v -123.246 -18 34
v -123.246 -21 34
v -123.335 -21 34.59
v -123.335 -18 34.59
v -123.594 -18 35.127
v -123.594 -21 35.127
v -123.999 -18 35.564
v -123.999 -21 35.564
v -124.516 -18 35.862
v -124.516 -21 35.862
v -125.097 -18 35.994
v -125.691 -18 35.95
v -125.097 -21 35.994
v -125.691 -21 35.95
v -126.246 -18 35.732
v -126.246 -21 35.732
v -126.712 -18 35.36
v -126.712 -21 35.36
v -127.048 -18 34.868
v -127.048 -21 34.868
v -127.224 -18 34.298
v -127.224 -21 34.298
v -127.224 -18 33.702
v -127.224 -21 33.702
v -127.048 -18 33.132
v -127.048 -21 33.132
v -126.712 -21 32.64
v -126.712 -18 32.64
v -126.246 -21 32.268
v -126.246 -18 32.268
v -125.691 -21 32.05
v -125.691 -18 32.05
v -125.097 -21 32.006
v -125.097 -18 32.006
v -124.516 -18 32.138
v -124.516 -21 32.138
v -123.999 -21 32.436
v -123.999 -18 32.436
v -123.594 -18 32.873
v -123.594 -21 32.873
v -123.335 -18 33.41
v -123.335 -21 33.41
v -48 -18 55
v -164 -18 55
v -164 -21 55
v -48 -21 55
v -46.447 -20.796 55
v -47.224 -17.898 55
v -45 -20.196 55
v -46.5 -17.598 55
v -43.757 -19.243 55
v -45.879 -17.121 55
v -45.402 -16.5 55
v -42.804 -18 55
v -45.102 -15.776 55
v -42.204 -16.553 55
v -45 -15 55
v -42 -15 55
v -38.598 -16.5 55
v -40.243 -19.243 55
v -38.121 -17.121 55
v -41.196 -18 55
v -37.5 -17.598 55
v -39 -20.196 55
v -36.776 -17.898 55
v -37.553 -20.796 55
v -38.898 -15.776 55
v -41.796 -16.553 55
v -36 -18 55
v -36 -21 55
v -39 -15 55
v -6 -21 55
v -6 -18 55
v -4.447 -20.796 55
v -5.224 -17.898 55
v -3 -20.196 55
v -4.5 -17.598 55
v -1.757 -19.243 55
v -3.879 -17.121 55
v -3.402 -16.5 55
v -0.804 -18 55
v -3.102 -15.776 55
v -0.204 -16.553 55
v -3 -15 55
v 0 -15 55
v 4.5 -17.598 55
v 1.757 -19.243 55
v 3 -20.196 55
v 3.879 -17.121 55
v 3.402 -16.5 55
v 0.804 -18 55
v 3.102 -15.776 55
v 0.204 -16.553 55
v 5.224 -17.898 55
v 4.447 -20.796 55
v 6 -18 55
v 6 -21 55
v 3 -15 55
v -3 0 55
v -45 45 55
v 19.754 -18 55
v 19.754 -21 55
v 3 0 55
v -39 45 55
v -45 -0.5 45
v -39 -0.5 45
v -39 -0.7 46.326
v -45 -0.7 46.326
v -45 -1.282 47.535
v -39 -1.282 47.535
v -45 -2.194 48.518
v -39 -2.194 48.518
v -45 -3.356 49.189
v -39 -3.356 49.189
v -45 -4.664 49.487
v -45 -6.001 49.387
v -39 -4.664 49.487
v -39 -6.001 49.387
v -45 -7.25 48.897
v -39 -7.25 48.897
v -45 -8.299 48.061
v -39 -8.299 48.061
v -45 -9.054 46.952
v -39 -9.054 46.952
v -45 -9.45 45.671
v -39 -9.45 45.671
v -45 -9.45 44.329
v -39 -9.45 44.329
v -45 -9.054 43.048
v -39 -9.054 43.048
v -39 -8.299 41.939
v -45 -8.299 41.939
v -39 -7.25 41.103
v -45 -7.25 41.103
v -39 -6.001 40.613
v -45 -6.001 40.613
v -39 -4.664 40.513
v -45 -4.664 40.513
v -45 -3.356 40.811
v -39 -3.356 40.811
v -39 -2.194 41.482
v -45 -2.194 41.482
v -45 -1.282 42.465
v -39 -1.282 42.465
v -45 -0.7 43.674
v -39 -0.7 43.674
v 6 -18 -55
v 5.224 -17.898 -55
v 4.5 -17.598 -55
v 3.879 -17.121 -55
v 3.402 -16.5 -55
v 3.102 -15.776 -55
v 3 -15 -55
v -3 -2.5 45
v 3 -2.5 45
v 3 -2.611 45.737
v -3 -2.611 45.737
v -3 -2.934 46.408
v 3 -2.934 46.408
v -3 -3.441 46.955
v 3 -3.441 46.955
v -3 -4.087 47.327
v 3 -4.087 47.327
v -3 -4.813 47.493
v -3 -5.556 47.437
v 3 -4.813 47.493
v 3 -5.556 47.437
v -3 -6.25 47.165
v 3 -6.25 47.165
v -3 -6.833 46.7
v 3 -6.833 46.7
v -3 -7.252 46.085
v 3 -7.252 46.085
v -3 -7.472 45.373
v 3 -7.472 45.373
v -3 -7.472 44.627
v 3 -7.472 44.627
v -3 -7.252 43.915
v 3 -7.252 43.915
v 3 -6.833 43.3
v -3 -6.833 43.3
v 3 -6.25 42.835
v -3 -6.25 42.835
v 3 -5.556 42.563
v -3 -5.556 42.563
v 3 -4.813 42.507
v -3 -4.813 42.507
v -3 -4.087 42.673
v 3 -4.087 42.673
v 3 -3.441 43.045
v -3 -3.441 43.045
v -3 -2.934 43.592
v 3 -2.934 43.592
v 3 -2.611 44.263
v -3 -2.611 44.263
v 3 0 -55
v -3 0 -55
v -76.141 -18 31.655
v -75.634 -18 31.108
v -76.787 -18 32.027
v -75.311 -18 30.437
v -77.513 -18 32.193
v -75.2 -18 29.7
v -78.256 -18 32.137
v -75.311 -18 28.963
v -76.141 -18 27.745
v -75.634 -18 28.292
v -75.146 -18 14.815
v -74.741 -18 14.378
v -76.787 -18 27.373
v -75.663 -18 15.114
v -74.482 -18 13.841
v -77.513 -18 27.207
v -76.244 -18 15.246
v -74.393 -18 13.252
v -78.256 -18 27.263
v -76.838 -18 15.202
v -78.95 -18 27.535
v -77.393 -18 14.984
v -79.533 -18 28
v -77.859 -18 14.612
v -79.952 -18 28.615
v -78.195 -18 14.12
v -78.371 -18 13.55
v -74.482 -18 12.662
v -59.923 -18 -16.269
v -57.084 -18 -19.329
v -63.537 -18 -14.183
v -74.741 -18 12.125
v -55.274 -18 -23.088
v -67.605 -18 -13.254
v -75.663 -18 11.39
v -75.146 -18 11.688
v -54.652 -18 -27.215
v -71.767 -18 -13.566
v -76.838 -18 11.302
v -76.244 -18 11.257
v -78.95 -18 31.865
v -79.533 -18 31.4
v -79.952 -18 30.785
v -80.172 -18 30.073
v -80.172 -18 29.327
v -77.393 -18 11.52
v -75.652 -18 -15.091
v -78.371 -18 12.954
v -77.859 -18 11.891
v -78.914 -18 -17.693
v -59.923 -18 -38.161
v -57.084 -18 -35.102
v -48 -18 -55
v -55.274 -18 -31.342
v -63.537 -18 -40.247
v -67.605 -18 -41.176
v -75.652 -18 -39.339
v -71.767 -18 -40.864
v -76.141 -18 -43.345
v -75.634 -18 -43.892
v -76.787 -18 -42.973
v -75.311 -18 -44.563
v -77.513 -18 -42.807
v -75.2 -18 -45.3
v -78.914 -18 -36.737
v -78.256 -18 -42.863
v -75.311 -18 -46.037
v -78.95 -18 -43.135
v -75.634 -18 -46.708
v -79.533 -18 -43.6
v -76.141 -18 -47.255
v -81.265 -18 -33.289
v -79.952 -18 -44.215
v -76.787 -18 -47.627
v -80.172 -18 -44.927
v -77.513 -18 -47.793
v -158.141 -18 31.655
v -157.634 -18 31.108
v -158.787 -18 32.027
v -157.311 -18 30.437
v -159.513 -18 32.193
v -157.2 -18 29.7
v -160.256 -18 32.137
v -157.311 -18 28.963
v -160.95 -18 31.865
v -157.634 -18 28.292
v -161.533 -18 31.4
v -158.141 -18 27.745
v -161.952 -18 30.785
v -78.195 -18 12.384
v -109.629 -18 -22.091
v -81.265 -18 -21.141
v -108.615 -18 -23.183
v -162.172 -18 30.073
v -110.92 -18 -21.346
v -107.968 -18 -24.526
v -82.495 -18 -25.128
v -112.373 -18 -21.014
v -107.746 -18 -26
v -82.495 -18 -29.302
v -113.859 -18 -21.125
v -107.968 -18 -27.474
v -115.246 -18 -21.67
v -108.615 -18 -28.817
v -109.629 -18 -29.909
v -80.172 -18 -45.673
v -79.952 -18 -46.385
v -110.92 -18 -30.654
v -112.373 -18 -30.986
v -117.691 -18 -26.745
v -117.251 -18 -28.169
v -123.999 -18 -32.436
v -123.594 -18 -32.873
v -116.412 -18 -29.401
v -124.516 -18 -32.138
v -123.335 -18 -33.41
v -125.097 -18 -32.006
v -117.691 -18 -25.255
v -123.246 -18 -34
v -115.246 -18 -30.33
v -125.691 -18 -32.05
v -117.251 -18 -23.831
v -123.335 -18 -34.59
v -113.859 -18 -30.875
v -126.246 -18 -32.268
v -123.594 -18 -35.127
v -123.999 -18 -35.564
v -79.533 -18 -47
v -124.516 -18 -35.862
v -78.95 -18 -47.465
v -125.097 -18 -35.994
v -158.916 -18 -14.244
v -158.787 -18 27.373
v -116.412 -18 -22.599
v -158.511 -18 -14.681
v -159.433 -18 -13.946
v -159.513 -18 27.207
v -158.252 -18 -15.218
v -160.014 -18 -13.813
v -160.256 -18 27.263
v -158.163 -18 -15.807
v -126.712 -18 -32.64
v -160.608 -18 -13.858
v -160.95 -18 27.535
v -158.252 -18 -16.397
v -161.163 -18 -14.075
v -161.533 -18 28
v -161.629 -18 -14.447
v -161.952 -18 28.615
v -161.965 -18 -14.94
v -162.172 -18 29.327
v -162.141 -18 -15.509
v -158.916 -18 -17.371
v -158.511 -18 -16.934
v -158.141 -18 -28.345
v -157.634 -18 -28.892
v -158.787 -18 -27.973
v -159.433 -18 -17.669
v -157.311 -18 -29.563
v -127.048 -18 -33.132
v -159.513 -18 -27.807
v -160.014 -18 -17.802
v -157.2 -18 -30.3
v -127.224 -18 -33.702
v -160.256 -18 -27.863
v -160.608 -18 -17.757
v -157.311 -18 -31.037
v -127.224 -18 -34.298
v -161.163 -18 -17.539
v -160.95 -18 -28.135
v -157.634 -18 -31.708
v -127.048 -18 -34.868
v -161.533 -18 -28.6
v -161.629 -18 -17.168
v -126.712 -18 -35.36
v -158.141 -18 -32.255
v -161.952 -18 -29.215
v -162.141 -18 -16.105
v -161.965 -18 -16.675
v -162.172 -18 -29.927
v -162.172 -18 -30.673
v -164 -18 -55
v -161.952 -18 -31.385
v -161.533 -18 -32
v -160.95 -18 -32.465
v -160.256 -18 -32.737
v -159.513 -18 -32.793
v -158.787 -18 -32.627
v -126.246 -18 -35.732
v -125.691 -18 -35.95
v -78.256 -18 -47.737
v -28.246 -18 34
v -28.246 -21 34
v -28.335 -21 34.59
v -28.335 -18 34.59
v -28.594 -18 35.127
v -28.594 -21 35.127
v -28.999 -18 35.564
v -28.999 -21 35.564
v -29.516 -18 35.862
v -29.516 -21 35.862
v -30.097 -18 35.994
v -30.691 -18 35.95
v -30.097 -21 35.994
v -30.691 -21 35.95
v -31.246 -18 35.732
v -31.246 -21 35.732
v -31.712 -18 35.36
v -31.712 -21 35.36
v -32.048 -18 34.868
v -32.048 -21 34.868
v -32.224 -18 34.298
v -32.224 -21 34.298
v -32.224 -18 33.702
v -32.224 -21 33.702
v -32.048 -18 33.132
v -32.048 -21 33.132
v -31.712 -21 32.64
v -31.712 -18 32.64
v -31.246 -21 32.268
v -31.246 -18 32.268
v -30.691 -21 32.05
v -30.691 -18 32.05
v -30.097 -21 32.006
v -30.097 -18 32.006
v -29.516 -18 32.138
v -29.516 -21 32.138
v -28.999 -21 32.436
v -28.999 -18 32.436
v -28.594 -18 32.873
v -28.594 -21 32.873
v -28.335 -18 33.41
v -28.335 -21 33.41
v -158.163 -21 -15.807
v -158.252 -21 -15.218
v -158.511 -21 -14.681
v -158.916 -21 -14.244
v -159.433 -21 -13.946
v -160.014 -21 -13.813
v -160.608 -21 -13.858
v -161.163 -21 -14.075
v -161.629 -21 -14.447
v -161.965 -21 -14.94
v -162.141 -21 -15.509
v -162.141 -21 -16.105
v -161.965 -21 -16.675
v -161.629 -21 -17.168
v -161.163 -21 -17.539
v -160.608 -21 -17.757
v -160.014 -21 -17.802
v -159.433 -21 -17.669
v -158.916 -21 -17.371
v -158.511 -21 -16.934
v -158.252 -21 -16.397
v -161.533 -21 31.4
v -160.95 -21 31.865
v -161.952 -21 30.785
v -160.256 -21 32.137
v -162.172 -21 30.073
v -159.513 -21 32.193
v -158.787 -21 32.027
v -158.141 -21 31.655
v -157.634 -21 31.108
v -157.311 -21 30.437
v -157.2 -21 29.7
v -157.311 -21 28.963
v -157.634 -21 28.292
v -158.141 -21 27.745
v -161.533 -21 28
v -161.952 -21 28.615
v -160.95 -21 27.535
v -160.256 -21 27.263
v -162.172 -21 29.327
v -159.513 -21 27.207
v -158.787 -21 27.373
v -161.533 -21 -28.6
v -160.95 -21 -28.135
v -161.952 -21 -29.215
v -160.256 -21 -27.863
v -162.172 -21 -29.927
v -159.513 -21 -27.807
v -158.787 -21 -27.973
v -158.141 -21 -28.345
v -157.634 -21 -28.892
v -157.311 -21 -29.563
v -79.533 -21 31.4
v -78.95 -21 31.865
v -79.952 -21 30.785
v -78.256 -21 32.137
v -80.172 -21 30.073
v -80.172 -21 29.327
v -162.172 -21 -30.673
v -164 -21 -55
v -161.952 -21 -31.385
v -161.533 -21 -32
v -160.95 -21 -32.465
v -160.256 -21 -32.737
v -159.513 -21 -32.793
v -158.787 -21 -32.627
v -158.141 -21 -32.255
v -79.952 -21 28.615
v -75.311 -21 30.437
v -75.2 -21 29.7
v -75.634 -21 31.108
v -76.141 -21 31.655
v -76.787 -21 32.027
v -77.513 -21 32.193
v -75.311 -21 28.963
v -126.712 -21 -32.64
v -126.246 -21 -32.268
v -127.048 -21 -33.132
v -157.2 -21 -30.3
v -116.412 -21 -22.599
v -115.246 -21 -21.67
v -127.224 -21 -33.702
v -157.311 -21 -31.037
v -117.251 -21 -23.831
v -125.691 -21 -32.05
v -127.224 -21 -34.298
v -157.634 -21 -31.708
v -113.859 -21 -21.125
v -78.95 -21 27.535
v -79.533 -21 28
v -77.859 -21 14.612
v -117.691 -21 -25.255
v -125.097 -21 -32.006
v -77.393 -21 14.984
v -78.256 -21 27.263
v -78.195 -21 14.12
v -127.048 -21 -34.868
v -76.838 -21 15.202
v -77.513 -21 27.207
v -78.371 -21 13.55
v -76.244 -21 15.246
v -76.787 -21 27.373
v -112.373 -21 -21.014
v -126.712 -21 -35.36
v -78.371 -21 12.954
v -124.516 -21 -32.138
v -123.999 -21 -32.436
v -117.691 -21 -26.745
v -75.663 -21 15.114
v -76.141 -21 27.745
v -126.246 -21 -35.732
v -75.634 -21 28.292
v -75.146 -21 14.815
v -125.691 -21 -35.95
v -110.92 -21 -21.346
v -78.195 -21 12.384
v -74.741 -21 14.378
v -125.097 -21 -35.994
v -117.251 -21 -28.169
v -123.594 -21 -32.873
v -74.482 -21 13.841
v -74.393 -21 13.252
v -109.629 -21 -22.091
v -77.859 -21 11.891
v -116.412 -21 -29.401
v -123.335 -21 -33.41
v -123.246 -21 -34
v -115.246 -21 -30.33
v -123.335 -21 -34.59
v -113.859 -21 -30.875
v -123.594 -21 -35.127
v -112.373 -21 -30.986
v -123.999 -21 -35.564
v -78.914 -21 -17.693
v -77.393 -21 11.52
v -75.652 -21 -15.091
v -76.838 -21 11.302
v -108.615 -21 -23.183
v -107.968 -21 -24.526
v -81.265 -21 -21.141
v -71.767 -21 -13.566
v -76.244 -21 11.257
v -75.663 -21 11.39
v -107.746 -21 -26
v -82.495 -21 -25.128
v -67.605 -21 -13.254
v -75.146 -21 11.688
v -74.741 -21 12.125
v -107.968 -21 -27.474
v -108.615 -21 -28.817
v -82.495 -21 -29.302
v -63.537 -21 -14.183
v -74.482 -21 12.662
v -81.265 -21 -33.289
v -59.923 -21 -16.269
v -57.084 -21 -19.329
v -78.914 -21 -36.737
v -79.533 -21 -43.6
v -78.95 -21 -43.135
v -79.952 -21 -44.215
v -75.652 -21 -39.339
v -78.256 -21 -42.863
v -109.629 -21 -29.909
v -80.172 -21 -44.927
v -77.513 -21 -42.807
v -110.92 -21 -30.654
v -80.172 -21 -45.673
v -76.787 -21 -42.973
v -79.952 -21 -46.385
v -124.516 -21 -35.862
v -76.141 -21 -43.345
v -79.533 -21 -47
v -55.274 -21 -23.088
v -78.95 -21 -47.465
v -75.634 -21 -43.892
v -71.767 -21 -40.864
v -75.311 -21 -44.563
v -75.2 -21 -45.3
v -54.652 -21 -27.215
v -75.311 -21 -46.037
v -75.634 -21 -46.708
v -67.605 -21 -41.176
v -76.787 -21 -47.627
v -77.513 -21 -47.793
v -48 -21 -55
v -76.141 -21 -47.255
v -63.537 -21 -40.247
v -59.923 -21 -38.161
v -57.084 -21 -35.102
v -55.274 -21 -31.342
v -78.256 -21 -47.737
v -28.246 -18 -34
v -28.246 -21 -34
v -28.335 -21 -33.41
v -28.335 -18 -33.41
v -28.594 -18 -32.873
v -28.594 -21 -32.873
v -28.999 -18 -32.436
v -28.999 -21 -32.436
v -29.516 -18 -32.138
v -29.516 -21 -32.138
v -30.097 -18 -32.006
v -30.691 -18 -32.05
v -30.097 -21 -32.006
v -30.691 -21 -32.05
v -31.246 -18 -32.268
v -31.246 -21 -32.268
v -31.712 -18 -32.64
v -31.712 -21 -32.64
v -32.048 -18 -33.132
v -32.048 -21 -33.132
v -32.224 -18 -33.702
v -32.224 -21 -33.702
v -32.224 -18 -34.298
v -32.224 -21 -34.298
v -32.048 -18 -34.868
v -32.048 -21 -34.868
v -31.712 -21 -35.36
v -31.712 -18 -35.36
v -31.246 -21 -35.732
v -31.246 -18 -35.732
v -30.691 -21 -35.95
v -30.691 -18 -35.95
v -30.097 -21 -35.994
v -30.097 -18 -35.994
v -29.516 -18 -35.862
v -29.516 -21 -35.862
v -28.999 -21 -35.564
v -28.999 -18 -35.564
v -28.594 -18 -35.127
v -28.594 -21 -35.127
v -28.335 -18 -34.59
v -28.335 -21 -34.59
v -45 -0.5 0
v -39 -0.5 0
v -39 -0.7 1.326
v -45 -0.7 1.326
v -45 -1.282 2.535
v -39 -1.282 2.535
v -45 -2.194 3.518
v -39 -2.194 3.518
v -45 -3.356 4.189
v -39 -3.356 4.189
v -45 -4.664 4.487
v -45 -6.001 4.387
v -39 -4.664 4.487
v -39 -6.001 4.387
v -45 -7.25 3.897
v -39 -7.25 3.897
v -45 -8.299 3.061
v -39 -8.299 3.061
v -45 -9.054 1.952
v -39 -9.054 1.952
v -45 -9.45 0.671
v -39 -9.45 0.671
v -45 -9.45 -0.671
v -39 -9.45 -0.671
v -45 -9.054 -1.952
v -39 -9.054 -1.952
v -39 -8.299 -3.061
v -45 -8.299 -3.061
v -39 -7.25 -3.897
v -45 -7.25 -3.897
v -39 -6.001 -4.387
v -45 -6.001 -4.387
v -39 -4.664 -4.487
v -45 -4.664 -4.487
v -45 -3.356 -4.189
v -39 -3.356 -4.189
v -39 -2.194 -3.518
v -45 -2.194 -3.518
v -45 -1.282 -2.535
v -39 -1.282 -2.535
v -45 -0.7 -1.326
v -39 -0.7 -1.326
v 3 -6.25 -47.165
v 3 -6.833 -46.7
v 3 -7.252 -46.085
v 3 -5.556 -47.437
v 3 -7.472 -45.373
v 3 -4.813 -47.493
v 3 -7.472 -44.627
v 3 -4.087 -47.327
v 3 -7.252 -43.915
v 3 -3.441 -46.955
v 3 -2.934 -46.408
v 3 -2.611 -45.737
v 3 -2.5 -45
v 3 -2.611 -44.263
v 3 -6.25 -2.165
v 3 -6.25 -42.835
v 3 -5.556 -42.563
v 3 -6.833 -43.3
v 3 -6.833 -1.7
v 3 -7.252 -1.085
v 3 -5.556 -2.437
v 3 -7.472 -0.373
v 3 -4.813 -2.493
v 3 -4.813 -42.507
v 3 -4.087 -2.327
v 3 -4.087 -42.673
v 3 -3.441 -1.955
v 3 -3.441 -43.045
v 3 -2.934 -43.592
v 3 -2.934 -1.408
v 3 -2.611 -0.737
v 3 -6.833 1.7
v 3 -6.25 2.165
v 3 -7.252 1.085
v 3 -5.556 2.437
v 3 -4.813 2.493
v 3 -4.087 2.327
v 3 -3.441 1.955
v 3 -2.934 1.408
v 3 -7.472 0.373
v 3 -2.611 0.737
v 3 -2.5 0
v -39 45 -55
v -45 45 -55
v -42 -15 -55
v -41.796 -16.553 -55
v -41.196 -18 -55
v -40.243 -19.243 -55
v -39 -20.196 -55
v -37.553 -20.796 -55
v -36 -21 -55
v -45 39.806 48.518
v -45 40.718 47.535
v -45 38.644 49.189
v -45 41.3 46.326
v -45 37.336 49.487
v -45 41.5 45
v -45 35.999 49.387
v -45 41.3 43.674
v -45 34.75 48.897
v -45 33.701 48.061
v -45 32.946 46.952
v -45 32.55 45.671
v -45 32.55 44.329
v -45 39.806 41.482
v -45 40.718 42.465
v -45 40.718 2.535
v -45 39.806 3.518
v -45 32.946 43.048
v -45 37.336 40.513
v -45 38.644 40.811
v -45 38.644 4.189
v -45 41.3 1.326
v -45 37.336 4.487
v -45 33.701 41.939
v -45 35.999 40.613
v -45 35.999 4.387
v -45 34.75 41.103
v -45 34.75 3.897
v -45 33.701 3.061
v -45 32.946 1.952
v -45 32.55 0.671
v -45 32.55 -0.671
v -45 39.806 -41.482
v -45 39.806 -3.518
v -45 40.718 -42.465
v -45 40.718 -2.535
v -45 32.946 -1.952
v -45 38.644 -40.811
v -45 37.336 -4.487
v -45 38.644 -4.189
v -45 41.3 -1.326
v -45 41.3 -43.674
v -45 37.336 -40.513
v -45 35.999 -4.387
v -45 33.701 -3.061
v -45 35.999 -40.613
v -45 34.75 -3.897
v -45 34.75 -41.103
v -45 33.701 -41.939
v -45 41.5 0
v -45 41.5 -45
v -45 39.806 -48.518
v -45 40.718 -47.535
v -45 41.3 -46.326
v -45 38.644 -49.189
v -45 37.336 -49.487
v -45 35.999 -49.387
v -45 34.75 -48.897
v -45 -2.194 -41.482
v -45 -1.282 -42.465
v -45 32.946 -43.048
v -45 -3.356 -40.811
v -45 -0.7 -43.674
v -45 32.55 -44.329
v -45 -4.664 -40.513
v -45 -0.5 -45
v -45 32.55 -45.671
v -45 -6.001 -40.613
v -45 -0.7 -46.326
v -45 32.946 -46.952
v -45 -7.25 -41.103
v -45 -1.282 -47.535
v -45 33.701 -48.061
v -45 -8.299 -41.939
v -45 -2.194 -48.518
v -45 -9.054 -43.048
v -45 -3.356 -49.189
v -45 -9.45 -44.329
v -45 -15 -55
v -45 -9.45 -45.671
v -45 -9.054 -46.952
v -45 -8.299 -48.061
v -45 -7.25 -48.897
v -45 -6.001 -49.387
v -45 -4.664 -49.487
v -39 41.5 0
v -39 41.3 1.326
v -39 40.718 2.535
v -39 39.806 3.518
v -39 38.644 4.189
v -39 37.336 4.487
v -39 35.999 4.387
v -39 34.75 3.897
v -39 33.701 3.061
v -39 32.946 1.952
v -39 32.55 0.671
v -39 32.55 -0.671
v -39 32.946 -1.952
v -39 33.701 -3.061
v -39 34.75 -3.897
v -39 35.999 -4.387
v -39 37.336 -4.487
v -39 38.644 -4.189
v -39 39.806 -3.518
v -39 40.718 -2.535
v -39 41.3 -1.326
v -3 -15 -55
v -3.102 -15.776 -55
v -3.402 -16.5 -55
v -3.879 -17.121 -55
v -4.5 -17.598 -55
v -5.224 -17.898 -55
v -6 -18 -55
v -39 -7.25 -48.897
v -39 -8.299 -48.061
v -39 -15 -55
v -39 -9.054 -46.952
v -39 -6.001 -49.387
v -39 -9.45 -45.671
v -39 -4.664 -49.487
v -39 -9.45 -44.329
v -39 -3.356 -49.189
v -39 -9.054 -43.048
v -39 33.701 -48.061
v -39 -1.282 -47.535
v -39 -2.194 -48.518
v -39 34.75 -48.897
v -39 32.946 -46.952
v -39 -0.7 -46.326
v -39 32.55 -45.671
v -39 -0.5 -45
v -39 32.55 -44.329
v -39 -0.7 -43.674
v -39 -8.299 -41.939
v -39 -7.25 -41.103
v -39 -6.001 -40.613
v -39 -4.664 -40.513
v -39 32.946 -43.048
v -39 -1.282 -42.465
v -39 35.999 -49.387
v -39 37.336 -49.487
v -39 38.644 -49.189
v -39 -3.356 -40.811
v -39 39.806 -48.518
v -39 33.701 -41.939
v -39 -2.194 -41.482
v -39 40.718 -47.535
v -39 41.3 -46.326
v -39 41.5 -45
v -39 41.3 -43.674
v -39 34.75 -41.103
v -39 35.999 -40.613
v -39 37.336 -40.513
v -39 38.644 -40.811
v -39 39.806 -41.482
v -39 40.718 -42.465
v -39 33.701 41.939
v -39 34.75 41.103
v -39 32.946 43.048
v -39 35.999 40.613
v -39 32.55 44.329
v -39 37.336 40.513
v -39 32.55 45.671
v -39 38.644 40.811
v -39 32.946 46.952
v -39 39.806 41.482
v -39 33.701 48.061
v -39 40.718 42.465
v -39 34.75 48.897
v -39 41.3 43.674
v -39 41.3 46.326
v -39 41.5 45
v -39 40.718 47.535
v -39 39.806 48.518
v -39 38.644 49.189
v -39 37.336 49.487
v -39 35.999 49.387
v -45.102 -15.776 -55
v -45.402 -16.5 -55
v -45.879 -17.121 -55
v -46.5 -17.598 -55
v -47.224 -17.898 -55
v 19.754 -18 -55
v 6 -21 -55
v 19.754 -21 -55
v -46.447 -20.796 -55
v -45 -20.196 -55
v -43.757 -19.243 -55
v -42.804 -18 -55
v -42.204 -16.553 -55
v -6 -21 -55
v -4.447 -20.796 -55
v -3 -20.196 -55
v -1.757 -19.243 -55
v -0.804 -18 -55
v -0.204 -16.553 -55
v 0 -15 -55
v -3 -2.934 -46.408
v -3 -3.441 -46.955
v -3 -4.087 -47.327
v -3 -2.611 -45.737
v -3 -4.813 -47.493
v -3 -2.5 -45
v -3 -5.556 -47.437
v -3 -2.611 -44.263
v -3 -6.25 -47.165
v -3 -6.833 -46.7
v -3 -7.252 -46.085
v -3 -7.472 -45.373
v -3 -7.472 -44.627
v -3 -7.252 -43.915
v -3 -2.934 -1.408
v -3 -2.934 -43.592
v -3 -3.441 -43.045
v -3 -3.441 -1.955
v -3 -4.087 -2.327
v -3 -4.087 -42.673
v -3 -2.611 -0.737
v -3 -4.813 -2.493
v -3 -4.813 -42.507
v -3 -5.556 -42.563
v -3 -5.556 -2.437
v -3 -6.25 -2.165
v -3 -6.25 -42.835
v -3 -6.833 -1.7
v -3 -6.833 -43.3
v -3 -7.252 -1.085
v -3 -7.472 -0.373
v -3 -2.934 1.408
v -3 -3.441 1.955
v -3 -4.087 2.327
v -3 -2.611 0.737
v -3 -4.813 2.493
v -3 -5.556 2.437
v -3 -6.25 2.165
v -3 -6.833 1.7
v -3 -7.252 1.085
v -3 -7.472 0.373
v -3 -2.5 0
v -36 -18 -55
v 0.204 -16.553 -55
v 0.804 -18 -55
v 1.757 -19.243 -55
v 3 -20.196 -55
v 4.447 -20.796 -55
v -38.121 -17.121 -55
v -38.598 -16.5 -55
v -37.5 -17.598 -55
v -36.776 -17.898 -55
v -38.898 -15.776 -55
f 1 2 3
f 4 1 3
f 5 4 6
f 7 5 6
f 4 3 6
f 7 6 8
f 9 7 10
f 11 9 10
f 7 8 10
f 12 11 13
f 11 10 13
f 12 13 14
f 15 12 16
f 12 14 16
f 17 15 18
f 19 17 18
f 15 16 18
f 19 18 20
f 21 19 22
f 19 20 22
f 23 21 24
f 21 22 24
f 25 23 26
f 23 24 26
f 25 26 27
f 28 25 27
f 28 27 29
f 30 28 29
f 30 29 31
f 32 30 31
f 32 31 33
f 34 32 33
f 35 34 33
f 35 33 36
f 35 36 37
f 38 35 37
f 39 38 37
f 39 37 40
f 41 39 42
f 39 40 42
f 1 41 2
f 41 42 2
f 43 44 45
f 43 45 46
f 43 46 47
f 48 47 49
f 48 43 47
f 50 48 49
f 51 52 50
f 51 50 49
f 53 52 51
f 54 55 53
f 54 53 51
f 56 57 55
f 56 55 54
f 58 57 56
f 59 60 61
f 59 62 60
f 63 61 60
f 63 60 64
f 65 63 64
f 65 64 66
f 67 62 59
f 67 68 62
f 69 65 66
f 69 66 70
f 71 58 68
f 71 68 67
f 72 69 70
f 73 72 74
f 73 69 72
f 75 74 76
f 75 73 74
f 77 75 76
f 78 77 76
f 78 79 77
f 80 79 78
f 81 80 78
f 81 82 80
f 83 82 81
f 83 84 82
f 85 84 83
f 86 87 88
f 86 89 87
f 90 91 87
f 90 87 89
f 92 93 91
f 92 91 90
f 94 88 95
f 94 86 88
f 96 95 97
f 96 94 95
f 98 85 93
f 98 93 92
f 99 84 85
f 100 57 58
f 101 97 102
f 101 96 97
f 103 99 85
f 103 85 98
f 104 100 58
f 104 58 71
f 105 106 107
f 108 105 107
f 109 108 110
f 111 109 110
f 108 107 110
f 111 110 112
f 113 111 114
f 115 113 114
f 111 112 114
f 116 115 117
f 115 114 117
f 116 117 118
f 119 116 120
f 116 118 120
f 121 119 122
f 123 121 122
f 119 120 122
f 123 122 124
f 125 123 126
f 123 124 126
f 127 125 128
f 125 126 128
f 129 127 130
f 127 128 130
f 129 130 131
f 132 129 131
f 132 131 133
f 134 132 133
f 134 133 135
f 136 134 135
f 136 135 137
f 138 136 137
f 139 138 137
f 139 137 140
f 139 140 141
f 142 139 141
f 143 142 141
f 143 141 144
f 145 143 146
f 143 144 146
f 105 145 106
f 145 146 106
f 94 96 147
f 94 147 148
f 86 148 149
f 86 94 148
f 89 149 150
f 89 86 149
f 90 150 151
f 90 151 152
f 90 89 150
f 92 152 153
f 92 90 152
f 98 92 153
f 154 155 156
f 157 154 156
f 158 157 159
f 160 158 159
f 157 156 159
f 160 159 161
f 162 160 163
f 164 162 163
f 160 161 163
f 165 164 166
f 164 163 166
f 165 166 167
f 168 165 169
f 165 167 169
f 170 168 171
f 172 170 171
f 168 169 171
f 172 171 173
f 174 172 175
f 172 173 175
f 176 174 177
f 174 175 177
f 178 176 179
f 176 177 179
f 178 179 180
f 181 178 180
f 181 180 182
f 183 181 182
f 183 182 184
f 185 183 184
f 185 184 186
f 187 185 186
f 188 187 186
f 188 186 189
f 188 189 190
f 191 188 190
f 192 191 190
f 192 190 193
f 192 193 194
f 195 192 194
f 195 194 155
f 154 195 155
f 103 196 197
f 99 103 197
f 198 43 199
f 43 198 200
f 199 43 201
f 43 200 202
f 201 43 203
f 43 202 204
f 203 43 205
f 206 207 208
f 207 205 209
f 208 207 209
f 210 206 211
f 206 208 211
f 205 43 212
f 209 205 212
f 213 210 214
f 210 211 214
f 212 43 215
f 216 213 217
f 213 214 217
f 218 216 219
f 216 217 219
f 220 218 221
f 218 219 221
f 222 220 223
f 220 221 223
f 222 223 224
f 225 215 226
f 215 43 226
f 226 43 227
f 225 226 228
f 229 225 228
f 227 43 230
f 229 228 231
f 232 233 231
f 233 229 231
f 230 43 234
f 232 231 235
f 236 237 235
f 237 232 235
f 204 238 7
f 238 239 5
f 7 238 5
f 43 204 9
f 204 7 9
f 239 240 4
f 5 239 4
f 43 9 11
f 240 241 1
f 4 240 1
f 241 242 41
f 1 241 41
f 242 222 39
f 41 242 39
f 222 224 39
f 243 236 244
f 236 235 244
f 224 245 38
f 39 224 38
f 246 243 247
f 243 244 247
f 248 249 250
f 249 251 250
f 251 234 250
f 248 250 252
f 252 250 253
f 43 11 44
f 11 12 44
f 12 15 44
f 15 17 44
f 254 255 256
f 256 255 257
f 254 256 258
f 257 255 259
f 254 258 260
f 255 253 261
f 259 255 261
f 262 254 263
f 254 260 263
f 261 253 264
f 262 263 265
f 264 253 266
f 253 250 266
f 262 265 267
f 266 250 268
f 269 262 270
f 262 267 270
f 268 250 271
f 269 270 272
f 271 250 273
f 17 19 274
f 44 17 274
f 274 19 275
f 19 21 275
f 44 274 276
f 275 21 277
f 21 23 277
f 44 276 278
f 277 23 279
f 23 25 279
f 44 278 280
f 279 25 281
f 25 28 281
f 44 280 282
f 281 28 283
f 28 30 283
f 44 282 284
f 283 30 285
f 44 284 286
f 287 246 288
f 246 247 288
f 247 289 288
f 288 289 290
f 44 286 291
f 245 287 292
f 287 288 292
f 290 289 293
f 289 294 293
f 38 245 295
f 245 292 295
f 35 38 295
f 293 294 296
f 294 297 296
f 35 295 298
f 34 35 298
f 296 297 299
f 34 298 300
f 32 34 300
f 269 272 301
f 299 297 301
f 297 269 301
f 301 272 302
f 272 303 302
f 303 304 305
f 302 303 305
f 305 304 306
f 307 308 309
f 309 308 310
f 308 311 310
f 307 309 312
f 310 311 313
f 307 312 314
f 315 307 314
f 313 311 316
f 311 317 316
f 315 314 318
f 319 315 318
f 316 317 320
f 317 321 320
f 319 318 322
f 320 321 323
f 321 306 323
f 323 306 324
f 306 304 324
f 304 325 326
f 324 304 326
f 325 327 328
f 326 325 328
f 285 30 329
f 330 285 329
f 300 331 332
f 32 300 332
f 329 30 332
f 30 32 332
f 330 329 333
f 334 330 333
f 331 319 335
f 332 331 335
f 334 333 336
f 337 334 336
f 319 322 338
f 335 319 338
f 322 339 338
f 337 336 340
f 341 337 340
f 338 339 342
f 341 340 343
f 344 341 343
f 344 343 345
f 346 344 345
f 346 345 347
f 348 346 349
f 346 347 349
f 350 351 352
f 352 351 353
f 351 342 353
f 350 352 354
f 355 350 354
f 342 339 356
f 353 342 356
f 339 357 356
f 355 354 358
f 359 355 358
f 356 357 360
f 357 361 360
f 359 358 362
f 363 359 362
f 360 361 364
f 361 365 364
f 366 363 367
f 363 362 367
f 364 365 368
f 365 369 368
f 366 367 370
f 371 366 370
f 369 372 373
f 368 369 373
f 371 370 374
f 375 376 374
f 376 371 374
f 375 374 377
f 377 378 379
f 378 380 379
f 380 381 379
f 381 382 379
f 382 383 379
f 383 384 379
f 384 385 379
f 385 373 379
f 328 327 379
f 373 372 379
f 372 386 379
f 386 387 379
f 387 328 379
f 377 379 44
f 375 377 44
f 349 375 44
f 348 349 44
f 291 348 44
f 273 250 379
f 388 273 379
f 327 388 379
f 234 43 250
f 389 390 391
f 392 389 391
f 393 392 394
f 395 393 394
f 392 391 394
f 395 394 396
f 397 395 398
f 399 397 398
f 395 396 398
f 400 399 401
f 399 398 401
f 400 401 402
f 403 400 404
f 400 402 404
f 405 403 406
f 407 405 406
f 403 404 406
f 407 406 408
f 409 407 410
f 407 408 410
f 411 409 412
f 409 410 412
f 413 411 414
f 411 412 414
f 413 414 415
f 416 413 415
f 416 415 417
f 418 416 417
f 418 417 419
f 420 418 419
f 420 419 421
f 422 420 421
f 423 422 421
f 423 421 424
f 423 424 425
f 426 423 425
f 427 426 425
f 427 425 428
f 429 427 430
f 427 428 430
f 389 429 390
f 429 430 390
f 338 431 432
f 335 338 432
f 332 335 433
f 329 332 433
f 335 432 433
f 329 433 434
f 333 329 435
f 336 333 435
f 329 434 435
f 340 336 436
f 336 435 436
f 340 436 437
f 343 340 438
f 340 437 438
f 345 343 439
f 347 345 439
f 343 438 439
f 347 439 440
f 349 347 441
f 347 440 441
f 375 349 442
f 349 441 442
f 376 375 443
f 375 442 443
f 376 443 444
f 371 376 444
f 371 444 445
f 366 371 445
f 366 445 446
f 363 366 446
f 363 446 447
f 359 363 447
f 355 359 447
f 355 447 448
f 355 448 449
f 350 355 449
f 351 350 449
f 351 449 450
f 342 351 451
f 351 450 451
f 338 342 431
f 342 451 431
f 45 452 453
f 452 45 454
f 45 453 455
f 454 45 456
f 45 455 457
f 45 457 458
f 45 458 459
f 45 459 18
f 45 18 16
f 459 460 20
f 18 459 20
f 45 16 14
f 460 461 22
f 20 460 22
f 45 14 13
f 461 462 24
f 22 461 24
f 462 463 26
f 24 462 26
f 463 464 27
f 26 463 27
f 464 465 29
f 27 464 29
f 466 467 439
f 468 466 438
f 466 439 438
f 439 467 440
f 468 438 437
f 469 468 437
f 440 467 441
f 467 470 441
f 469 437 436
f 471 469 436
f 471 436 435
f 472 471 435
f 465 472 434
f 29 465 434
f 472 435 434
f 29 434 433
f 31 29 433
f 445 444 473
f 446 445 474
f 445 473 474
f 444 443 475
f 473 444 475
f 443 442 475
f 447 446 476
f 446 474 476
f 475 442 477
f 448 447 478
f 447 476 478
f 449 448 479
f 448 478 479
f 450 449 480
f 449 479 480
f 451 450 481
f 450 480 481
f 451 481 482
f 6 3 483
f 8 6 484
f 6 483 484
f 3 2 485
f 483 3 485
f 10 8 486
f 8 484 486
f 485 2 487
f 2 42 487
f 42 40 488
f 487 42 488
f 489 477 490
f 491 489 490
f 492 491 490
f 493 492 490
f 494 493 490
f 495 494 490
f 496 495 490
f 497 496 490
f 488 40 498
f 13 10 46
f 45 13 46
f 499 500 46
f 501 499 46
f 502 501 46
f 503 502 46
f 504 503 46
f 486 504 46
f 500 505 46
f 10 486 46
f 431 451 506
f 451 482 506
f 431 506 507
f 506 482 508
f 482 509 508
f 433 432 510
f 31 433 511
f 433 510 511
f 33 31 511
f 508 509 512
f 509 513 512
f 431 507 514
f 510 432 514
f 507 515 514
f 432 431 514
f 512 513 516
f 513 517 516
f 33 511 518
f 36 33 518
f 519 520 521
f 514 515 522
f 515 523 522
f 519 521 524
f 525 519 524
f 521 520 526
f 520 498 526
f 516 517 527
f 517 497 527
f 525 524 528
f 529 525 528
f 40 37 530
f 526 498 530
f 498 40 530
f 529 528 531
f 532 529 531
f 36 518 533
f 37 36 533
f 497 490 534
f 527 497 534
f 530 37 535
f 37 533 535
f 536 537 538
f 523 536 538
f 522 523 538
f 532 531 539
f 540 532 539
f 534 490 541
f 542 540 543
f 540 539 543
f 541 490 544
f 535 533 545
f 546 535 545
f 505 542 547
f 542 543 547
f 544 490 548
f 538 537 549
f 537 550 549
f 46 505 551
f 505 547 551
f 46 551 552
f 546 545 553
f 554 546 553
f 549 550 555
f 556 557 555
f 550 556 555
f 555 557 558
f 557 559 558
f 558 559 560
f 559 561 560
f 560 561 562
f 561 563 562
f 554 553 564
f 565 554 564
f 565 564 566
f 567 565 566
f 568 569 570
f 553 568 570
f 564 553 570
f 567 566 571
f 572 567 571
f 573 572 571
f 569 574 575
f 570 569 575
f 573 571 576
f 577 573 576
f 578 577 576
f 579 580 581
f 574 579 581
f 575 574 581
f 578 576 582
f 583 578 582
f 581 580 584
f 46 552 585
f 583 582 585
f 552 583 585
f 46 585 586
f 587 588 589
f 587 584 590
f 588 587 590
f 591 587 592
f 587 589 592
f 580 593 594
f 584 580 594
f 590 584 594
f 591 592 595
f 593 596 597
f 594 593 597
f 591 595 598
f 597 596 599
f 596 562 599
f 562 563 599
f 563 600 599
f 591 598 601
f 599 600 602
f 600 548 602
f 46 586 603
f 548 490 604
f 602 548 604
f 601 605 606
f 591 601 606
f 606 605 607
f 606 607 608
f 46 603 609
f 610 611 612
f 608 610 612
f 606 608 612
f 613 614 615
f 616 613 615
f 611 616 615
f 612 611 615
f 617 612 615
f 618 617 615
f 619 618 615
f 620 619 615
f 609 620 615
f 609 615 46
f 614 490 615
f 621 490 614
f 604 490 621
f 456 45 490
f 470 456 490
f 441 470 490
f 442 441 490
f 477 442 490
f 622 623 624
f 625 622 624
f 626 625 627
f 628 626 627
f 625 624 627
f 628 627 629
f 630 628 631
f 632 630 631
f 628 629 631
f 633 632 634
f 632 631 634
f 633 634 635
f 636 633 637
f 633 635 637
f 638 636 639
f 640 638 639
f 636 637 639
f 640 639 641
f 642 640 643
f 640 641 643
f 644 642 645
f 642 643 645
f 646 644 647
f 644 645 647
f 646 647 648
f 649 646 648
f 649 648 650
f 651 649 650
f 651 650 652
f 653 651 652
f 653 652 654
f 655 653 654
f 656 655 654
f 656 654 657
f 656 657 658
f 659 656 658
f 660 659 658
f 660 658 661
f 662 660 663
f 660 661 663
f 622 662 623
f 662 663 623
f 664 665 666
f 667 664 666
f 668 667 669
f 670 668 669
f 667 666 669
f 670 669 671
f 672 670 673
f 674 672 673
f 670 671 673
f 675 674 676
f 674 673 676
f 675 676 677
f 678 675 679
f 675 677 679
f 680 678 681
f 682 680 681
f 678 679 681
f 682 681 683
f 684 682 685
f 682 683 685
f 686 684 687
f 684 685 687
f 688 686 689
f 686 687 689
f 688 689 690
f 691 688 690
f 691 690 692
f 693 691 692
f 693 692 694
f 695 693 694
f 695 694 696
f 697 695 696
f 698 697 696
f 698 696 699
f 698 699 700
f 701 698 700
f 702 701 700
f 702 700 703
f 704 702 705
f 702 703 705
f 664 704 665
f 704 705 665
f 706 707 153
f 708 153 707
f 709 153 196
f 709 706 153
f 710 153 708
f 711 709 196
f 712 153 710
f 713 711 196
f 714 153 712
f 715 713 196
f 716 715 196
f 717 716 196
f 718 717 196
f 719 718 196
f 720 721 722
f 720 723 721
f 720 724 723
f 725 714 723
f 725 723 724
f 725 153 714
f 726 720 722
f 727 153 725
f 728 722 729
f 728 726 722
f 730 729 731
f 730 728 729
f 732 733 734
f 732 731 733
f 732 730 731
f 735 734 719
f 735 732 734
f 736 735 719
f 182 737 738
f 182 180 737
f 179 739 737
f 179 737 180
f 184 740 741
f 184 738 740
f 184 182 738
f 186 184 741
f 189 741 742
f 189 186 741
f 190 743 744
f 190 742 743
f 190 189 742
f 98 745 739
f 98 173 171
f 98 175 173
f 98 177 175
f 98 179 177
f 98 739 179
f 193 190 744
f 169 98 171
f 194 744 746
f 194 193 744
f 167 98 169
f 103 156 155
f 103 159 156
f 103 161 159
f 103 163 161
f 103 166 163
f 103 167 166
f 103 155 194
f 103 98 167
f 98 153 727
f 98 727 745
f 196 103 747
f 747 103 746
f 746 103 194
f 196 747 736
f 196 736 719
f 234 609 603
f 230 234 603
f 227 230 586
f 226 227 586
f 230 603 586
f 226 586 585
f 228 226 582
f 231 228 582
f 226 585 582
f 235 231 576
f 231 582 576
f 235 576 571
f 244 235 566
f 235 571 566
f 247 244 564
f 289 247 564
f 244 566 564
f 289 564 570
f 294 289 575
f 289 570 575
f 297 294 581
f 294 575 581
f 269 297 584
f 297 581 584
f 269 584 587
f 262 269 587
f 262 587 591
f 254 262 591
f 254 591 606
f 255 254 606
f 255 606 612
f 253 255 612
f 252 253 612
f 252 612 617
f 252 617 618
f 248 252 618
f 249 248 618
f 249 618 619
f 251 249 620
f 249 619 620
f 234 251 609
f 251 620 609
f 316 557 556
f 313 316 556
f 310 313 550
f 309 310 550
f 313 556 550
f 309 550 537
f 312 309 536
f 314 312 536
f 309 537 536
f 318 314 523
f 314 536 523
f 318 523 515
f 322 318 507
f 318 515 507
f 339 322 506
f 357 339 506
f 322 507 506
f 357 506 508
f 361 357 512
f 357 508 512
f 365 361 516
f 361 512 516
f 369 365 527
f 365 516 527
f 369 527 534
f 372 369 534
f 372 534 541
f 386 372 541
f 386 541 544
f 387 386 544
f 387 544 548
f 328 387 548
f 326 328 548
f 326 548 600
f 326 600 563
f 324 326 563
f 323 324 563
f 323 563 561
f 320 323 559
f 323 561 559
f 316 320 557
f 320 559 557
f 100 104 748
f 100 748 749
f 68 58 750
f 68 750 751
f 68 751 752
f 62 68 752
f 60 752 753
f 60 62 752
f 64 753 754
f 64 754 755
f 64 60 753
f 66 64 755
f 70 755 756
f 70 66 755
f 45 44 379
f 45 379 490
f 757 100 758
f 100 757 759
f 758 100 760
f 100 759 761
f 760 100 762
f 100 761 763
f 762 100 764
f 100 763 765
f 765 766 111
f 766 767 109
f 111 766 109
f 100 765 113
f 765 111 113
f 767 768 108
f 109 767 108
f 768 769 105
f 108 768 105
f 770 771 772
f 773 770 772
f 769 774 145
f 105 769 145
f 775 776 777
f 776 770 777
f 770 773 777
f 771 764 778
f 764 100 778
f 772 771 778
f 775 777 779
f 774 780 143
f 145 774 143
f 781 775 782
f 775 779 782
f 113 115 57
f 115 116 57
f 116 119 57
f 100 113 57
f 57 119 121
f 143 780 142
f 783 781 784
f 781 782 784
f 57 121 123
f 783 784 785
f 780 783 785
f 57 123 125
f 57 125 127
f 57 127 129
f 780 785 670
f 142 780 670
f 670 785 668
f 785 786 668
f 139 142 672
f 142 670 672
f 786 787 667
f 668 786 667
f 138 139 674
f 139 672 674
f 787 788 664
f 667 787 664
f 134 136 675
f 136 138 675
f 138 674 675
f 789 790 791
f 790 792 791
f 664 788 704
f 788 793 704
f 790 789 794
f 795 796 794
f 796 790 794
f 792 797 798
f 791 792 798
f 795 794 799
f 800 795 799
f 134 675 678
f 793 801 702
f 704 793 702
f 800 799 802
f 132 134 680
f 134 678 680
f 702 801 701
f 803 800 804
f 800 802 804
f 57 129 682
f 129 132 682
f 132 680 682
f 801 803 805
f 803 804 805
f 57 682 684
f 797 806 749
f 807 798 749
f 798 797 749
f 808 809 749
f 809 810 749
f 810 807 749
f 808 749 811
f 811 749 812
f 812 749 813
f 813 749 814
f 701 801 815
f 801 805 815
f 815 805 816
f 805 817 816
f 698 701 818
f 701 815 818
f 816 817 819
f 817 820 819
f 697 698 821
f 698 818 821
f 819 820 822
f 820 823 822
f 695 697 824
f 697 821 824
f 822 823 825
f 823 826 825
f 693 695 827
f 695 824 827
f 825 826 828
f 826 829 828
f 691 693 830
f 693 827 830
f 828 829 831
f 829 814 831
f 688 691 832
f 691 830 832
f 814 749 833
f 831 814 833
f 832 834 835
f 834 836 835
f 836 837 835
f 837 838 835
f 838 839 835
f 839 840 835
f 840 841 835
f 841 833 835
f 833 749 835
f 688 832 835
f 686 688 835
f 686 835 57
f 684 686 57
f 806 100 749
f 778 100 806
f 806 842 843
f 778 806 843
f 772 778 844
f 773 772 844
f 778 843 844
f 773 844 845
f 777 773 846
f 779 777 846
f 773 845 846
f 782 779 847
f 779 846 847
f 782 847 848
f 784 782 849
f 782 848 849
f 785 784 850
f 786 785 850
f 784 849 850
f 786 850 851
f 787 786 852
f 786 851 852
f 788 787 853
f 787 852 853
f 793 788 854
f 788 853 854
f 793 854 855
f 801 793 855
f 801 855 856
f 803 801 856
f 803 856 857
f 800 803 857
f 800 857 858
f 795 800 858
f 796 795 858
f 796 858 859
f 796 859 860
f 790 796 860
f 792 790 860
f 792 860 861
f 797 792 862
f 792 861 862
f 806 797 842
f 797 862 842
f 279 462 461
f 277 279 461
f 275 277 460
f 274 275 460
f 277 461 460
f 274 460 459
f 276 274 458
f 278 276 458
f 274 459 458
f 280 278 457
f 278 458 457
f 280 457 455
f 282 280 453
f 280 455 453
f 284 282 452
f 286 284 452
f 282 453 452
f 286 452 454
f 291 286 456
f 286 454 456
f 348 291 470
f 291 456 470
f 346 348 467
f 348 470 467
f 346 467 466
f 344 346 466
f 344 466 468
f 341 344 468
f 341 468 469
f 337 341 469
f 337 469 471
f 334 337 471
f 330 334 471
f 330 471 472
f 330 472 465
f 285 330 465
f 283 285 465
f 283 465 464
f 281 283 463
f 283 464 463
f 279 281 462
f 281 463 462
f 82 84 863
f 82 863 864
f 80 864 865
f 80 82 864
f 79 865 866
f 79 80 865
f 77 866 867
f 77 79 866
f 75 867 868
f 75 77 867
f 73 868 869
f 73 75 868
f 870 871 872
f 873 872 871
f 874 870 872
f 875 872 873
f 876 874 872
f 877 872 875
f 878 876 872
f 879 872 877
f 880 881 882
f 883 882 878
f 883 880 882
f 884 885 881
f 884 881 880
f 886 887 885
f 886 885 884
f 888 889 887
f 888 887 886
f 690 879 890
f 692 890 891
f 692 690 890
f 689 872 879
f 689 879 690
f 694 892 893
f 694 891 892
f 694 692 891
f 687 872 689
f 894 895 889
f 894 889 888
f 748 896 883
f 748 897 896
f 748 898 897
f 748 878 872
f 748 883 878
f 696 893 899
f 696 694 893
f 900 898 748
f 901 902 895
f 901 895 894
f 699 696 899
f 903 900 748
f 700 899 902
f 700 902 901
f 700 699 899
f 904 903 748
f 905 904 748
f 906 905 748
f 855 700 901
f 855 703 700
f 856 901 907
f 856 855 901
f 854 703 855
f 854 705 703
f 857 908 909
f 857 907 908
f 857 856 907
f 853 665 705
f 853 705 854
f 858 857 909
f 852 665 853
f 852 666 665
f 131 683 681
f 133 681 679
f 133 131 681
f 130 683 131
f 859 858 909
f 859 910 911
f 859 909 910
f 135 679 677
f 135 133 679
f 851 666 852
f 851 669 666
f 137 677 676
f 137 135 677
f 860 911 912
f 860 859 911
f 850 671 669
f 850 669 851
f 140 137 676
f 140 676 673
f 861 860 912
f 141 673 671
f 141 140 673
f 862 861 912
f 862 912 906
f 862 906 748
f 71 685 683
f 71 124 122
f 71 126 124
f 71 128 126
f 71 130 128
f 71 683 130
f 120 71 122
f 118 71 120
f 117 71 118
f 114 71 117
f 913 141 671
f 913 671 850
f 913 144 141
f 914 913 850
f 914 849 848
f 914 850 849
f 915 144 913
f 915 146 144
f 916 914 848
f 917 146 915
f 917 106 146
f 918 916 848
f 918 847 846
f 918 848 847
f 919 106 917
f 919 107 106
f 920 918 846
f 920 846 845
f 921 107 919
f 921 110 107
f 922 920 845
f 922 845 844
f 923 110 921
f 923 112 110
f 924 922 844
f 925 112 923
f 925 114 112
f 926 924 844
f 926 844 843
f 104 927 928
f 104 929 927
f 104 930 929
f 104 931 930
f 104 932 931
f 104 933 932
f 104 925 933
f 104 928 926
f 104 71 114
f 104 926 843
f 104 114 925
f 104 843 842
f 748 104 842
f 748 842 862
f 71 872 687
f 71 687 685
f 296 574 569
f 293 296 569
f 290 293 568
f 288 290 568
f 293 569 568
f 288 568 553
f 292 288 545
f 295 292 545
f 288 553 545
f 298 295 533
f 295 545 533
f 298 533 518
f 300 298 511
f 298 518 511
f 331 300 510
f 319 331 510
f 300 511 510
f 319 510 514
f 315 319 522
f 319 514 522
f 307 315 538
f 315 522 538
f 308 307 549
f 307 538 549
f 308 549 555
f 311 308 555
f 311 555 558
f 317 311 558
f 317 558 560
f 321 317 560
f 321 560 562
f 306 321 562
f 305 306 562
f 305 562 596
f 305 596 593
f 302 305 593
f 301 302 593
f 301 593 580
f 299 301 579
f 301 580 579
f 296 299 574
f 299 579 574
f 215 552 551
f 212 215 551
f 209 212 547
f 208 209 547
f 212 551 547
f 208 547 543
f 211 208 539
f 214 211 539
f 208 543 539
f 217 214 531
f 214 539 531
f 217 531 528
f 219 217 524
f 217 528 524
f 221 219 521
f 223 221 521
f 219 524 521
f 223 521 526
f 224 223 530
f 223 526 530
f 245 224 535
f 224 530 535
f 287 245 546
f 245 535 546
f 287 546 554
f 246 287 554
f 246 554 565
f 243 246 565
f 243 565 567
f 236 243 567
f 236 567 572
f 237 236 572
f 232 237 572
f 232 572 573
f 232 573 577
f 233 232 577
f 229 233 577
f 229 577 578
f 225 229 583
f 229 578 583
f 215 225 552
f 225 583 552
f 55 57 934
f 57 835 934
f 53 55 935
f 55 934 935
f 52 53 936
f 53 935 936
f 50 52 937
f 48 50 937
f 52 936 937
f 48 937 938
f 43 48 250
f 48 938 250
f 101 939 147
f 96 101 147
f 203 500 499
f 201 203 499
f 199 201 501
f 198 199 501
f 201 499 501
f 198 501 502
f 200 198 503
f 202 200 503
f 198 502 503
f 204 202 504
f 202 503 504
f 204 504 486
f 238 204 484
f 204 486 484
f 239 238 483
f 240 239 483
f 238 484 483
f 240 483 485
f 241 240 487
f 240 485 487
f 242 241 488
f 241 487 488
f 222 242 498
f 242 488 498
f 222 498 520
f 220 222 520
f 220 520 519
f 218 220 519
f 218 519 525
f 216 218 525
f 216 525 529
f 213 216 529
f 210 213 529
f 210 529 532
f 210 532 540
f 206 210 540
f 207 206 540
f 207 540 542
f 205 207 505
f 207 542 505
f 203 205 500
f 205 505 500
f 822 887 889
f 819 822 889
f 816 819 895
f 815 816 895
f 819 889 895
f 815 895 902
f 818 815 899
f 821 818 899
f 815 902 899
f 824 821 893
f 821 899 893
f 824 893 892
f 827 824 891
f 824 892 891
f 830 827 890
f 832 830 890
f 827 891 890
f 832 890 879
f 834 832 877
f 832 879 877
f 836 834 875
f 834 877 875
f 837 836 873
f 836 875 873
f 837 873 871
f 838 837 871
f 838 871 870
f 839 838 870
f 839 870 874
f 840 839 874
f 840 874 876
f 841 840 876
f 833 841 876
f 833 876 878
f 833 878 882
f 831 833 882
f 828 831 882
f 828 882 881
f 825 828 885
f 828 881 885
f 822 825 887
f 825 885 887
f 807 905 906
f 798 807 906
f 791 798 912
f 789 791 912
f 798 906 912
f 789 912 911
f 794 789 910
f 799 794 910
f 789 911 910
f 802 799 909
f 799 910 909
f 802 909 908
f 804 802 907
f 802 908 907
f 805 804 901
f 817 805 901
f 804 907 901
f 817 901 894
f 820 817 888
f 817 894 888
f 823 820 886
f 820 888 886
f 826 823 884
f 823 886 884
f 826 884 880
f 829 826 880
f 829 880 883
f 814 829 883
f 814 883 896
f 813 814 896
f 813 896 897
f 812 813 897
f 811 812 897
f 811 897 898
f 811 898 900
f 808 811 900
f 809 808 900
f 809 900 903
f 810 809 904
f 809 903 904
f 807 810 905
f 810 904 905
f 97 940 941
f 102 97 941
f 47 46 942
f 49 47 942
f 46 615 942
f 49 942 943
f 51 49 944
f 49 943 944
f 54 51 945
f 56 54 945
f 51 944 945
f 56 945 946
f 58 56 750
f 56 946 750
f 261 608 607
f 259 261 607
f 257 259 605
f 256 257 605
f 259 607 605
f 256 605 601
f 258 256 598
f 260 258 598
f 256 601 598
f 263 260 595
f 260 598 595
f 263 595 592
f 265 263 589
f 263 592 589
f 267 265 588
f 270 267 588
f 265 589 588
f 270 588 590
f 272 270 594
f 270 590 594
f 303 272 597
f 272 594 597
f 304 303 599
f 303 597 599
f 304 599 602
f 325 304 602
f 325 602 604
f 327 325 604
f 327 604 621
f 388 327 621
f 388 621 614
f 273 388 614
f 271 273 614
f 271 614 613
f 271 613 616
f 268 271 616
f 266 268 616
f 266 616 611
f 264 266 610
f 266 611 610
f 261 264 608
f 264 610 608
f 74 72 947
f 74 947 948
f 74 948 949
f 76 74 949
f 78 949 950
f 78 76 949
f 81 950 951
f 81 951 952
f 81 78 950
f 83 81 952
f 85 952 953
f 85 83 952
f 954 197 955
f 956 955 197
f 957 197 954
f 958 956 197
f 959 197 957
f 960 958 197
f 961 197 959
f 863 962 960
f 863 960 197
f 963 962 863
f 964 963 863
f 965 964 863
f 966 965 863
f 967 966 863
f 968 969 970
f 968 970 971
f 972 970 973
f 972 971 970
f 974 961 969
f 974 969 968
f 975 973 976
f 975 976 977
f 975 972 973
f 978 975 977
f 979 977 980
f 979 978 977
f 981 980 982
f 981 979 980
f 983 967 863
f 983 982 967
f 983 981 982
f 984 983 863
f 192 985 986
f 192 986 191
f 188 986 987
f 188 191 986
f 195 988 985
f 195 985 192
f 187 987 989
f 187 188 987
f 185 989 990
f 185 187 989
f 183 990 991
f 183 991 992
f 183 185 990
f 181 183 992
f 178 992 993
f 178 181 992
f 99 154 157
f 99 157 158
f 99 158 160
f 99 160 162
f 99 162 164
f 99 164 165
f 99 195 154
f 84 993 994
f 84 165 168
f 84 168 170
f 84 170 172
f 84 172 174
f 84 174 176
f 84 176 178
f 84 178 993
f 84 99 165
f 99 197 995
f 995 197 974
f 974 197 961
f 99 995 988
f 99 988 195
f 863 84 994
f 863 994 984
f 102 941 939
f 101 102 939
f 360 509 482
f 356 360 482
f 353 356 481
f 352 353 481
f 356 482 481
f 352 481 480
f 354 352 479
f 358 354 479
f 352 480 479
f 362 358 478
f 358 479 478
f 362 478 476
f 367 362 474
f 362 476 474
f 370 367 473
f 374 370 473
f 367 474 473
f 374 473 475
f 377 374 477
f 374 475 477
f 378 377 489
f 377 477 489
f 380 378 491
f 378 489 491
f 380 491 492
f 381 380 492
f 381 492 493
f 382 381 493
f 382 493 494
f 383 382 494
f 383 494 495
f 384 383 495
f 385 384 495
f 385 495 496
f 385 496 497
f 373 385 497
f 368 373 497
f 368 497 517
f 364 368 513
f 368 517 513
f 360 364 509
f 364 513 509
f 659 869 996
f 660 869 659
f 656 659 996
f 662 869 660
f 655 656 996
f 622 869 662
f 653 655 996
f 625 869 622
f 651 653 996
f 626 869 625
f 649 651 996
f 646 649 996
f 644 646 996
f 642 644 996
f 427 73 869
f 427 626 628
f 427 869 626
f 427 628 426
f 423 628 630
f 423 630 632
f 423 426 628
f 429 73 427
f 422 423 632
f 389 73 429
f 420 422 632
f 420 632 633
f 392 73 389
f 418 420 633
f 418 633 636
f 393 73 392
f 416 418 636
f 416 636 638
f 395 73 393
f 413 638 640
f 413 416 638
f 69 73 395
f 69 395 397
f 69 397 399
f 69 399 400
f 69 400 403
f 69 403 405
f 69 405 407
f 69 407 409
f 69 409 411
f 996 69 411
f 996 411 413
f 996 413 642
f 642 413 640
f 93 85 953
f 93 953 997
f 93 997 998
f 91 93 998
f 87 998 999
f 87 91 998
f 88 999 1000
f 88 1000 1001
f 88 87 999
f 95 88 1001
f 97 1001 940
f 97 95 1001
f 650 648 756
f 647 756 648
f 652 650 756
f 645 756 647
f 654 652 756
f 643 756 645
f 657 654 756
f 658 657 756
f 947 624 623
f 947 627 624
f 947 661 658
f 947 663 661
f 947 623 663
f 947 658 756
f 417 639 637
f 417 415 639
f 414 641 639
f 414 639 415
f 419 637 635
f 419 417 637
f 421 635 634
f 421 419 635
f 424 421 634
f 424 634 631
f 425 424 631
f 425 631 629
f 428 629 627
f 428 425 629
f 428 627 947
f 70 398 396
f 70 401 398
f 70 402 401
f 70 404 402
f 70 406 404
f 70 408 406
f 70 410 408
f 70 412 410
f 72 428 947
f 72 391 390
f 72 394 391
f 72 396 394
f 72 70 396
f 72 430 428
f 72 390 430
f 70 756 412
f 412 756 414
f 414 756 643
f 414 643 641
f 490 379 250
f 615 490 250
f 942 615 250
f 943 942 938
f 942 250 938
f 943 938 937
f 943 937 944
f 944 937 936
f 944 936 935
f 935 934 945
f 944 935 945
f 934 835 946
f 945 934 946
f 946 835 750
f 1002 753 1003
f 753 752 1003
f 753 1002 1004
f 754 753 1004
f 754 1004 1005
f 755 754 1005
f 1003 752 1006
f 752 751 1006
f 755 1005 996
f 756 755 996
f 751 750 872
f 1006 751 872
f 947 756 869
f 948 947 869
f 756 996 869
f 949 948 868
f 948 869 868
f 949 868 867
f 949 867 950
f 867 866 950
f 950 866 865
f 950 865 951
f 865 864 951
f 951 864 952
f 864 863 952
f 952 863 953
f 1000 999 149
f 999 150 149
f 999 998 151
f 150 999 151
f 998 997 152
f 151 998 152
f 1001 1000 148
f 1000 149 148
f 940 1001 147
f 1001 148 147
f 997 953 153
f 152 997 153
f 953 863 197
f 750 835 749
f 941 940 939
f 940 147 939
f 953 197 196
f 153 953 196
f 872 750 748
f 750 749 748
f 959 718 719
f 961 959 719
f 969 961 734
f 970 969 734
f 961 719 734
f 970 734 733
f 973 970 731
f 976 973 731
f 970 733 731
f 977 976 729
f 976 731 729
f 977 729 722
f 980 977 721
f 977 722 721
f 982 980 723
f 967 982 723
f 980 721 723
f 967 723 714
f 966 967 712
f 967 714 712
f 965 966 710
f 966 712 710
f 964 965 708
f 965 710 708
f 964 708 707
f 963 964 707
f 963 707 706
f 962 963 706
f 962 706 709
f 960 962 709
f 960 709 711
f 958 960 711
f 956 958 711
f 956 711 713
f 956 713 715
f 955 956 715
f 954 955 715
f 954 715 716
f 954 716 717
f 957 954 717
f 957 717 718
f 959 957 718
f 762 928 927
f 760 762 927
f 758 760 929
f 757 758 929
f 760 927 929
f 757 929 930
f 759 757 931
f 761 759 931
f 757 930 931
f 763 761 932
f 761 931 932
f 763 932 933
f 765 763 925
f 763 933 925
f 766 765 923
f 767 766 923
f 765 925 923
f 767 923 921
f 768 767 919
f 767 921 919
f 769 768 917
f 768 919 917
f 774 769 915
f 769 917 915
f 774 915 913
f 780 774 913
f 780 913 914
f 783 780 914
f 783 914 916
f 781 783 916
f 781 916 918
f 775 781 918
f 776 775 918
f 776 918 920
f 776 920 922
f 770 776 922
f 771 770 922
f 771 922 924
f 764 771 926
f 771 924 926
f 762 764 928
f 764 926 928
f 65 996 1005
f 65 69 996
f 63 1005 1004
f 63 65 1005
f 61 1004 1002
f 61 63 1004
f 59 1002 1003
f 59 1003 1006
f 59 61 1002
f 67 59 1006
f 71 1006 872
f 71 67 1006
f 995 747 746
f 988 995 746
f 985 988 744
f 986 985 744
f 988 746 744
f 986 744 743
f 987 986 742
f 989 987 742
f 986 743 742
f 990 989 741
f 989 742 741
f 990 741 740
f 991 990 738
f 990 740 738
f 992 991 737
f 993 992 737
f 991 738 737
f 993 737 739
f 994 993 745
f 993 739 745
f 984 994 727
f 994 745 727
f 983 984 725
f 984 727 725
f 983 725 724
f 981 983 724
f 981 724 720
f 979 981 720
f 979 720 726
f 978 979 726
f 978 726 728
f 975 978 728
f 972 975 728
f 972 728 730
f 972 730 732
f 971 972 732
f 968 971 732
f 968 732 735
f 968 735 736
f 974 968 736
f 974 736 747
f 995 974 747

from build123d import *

# Parameters (mm, degrees)
F1_DEPTH      = 55
F1_DEPTH_BACK = 55
F2_R          = 2.5
F3_DEPTH      = 45.001
F5_DEPTH      = 55
F5_DEPTH_BACK = 55
F6_R          = 4.5
F7_DEPTH      = 6
F8_R          = 4.5
F9_DEPTH      = 6
F10_R         = 2
F11_DEPTH     = 3
F12_R         = 14
F13_DEPTH     = 3
F14_R         = 2.5
F15_DEPTH     = 3
F16_R         = 5
F17_DEPTH     = 3
F18_R         = 2
F19_DEPTH     = 3


with BuildPart() as f1:
    # F0 (on Top) → F1 (new body, two sides)
    with BuildSketch(Plane.XY) as f1_sk:
        with BuildLine():
            Line((-39, 45), (-42, 45))
            Line((-42, 45), (-42, -15))
            ThreePointArc((-42, -15), (-40.242641, -19.242641), (-36, -21))
            Line((-36, -21), (-6, -21))
            ThreePointArc((-6, -21), (-1.757359, -19.242641), (0, -15))
            ThreePointArc((0, -15), (1.757359, -19.242641), (6, -21))
            Line((6, -21), (19.753644, -21))
            Line((19.753644, -21), (19.753644, -18))
            Line((19.753644, -18), (6, -18))
            ThreePointArc((6, -18), (3.87868, -17.12132), (3, -15))
            Line((3, -15), (3, 0))
            Line((3, 0), (-3, 0))
            Line((-3, 0), (-3, -15))
            ThreePointArc((-3, -15), (-3.87868, -17.12132), (-6, -18))
            Line((-6, -18), (-36, -18))
            ThreePointArc((-36, -18), (-38.12132, -17.12132), (-39, -15))
            Line((-39, -15), (-39, 45))
        make_face()
    extrude(amount=F1_DEPTH)
    extrude(f1_sk.sketch, amount=-F1_DEPTH_BACK)

    # F2 (on face) → F3 (cut, through all)
    with BuildSketch(Plane.YZ.offset(3)):
        with Locations((-5, 45)):
            Circle(F2_R)
        with Locations((-5, 0)):
            Circle(F2_R)
        with Locations((-5, -45)):
            Circle(F2_R)
    extrude(amount=-F3_DEPTH, mode=Mode.SUBTRACT)

    # F4 (on Top) → F5 (join, two sides)
    with BuildSketch(Plane.XY) as f5_sk:
        with BuildLine():
            Line((-42, -15), (-42, 45))
            Line((-42, 45), (-45, 45))
            Line((-45, 45), (-45, -15))
            ThreePointArc((-45, -15), (-45.87868, -17.12132), (-48, -18))
            Line((-48, -18), (-164, -18))
            Line((-164, -18), (-164, -21))
            Line((-164, -21), (-48, -21))
            ThreePointArc((-48, -21), (-43.757359, -19.242641), (-42, -15))
        make_face()
    extrude(amount=F5_DEPTH)
    extrude(f5_sk.sketch, amount=-F5_DEPTH_BACK)

    # F6 (on face) → F7 (cut)
    with BuildSketch(Plane.YZ.offset(-39)):
        with Locations((-5, 45)):
            Circle(F6_R)
        with Locations((-5, 0)):
            Circle(F6_R)
        with Locations((-5, -45)):
            Circle(F6_R)
    extrude(amount=-F7_DEPTH, mode=Mode.SUBTRACT)

    # F8 (on face) → F9 (cut)
    with BuildSketch(Plane.YZ.offset(-39)):
        with Locations((37, 0)):
            Circle(F8_R)
        with Locations((37, -45)):
            Circle(F8_R)
        with Locations((37, 45)):
            Circle(F8_R)
    extrude(amount=-F9_DEPTH, mode=Mode.SUBTRACT)

    # F10 (on face) → F11 (cut)
    with BuildSketch(Plane.XZ.offset(21)):
        with Locations((-30.246356, -34)):
            Circle(F10_R)
        with Locations((-30.246356, 34)):
            Circle(F10_R)
        with Locations((-125.246356, 34)):
            Circle(F10_R)
        with Locations((-125.246356, -34)):
            Circle(F10_R)
    extrude(amount=-F11_DEPTH, mode=Mode.SUBTRACT)

    # F12 (on face) → F13 (cut)
    with BuildSketch(Plane.XZ.offset(21)):
        with Locations((-68.651619, -27.215034)):
            Circle(F12_R)
    extrude(amount=-F13_DEPTH, mode=Mode.SUBTRACT)

    # F14 (on face) → F15 (cut)
    with BuildSketch(Plane.XZ.offset(21)):
        with Locations((-159.7, 29.7)):
            Circle(F14_R)
        with Locations((-159.7, -30.3)):
            Circle(F14_R)
        with Locations((-77.7, 29.7)):
            Circle(F14_R)
        with Locations((-77.7, -45.3)):
            Circle(F14_R)
    extrude(amount=-F15_DEPTH, mode=Mode.SUBTRACT)

    # F16 (on face) → F17 (cut)
    with BuildSketch(Plane.XZ.offset(21)):
        with Locations((-112.746356, -26)):
            Circle(F16_R)
    extrude(amount=-F17_DEPTH, mode=Mode.SUBTRACT)

    # F18 (on face) → F19 (cut)
    with BuildSketch(Plane.XZ.offset(21)):
        with Locations((-76.393303, 13.251823)):
            Circle(F18_R)
        with Locations((-160.16324, -15.807402)):
            Circle(F18_R)
    extrude(amount=-F19_DEPTH, mode=Mode.SUBTRACT)


solid = f1.part
